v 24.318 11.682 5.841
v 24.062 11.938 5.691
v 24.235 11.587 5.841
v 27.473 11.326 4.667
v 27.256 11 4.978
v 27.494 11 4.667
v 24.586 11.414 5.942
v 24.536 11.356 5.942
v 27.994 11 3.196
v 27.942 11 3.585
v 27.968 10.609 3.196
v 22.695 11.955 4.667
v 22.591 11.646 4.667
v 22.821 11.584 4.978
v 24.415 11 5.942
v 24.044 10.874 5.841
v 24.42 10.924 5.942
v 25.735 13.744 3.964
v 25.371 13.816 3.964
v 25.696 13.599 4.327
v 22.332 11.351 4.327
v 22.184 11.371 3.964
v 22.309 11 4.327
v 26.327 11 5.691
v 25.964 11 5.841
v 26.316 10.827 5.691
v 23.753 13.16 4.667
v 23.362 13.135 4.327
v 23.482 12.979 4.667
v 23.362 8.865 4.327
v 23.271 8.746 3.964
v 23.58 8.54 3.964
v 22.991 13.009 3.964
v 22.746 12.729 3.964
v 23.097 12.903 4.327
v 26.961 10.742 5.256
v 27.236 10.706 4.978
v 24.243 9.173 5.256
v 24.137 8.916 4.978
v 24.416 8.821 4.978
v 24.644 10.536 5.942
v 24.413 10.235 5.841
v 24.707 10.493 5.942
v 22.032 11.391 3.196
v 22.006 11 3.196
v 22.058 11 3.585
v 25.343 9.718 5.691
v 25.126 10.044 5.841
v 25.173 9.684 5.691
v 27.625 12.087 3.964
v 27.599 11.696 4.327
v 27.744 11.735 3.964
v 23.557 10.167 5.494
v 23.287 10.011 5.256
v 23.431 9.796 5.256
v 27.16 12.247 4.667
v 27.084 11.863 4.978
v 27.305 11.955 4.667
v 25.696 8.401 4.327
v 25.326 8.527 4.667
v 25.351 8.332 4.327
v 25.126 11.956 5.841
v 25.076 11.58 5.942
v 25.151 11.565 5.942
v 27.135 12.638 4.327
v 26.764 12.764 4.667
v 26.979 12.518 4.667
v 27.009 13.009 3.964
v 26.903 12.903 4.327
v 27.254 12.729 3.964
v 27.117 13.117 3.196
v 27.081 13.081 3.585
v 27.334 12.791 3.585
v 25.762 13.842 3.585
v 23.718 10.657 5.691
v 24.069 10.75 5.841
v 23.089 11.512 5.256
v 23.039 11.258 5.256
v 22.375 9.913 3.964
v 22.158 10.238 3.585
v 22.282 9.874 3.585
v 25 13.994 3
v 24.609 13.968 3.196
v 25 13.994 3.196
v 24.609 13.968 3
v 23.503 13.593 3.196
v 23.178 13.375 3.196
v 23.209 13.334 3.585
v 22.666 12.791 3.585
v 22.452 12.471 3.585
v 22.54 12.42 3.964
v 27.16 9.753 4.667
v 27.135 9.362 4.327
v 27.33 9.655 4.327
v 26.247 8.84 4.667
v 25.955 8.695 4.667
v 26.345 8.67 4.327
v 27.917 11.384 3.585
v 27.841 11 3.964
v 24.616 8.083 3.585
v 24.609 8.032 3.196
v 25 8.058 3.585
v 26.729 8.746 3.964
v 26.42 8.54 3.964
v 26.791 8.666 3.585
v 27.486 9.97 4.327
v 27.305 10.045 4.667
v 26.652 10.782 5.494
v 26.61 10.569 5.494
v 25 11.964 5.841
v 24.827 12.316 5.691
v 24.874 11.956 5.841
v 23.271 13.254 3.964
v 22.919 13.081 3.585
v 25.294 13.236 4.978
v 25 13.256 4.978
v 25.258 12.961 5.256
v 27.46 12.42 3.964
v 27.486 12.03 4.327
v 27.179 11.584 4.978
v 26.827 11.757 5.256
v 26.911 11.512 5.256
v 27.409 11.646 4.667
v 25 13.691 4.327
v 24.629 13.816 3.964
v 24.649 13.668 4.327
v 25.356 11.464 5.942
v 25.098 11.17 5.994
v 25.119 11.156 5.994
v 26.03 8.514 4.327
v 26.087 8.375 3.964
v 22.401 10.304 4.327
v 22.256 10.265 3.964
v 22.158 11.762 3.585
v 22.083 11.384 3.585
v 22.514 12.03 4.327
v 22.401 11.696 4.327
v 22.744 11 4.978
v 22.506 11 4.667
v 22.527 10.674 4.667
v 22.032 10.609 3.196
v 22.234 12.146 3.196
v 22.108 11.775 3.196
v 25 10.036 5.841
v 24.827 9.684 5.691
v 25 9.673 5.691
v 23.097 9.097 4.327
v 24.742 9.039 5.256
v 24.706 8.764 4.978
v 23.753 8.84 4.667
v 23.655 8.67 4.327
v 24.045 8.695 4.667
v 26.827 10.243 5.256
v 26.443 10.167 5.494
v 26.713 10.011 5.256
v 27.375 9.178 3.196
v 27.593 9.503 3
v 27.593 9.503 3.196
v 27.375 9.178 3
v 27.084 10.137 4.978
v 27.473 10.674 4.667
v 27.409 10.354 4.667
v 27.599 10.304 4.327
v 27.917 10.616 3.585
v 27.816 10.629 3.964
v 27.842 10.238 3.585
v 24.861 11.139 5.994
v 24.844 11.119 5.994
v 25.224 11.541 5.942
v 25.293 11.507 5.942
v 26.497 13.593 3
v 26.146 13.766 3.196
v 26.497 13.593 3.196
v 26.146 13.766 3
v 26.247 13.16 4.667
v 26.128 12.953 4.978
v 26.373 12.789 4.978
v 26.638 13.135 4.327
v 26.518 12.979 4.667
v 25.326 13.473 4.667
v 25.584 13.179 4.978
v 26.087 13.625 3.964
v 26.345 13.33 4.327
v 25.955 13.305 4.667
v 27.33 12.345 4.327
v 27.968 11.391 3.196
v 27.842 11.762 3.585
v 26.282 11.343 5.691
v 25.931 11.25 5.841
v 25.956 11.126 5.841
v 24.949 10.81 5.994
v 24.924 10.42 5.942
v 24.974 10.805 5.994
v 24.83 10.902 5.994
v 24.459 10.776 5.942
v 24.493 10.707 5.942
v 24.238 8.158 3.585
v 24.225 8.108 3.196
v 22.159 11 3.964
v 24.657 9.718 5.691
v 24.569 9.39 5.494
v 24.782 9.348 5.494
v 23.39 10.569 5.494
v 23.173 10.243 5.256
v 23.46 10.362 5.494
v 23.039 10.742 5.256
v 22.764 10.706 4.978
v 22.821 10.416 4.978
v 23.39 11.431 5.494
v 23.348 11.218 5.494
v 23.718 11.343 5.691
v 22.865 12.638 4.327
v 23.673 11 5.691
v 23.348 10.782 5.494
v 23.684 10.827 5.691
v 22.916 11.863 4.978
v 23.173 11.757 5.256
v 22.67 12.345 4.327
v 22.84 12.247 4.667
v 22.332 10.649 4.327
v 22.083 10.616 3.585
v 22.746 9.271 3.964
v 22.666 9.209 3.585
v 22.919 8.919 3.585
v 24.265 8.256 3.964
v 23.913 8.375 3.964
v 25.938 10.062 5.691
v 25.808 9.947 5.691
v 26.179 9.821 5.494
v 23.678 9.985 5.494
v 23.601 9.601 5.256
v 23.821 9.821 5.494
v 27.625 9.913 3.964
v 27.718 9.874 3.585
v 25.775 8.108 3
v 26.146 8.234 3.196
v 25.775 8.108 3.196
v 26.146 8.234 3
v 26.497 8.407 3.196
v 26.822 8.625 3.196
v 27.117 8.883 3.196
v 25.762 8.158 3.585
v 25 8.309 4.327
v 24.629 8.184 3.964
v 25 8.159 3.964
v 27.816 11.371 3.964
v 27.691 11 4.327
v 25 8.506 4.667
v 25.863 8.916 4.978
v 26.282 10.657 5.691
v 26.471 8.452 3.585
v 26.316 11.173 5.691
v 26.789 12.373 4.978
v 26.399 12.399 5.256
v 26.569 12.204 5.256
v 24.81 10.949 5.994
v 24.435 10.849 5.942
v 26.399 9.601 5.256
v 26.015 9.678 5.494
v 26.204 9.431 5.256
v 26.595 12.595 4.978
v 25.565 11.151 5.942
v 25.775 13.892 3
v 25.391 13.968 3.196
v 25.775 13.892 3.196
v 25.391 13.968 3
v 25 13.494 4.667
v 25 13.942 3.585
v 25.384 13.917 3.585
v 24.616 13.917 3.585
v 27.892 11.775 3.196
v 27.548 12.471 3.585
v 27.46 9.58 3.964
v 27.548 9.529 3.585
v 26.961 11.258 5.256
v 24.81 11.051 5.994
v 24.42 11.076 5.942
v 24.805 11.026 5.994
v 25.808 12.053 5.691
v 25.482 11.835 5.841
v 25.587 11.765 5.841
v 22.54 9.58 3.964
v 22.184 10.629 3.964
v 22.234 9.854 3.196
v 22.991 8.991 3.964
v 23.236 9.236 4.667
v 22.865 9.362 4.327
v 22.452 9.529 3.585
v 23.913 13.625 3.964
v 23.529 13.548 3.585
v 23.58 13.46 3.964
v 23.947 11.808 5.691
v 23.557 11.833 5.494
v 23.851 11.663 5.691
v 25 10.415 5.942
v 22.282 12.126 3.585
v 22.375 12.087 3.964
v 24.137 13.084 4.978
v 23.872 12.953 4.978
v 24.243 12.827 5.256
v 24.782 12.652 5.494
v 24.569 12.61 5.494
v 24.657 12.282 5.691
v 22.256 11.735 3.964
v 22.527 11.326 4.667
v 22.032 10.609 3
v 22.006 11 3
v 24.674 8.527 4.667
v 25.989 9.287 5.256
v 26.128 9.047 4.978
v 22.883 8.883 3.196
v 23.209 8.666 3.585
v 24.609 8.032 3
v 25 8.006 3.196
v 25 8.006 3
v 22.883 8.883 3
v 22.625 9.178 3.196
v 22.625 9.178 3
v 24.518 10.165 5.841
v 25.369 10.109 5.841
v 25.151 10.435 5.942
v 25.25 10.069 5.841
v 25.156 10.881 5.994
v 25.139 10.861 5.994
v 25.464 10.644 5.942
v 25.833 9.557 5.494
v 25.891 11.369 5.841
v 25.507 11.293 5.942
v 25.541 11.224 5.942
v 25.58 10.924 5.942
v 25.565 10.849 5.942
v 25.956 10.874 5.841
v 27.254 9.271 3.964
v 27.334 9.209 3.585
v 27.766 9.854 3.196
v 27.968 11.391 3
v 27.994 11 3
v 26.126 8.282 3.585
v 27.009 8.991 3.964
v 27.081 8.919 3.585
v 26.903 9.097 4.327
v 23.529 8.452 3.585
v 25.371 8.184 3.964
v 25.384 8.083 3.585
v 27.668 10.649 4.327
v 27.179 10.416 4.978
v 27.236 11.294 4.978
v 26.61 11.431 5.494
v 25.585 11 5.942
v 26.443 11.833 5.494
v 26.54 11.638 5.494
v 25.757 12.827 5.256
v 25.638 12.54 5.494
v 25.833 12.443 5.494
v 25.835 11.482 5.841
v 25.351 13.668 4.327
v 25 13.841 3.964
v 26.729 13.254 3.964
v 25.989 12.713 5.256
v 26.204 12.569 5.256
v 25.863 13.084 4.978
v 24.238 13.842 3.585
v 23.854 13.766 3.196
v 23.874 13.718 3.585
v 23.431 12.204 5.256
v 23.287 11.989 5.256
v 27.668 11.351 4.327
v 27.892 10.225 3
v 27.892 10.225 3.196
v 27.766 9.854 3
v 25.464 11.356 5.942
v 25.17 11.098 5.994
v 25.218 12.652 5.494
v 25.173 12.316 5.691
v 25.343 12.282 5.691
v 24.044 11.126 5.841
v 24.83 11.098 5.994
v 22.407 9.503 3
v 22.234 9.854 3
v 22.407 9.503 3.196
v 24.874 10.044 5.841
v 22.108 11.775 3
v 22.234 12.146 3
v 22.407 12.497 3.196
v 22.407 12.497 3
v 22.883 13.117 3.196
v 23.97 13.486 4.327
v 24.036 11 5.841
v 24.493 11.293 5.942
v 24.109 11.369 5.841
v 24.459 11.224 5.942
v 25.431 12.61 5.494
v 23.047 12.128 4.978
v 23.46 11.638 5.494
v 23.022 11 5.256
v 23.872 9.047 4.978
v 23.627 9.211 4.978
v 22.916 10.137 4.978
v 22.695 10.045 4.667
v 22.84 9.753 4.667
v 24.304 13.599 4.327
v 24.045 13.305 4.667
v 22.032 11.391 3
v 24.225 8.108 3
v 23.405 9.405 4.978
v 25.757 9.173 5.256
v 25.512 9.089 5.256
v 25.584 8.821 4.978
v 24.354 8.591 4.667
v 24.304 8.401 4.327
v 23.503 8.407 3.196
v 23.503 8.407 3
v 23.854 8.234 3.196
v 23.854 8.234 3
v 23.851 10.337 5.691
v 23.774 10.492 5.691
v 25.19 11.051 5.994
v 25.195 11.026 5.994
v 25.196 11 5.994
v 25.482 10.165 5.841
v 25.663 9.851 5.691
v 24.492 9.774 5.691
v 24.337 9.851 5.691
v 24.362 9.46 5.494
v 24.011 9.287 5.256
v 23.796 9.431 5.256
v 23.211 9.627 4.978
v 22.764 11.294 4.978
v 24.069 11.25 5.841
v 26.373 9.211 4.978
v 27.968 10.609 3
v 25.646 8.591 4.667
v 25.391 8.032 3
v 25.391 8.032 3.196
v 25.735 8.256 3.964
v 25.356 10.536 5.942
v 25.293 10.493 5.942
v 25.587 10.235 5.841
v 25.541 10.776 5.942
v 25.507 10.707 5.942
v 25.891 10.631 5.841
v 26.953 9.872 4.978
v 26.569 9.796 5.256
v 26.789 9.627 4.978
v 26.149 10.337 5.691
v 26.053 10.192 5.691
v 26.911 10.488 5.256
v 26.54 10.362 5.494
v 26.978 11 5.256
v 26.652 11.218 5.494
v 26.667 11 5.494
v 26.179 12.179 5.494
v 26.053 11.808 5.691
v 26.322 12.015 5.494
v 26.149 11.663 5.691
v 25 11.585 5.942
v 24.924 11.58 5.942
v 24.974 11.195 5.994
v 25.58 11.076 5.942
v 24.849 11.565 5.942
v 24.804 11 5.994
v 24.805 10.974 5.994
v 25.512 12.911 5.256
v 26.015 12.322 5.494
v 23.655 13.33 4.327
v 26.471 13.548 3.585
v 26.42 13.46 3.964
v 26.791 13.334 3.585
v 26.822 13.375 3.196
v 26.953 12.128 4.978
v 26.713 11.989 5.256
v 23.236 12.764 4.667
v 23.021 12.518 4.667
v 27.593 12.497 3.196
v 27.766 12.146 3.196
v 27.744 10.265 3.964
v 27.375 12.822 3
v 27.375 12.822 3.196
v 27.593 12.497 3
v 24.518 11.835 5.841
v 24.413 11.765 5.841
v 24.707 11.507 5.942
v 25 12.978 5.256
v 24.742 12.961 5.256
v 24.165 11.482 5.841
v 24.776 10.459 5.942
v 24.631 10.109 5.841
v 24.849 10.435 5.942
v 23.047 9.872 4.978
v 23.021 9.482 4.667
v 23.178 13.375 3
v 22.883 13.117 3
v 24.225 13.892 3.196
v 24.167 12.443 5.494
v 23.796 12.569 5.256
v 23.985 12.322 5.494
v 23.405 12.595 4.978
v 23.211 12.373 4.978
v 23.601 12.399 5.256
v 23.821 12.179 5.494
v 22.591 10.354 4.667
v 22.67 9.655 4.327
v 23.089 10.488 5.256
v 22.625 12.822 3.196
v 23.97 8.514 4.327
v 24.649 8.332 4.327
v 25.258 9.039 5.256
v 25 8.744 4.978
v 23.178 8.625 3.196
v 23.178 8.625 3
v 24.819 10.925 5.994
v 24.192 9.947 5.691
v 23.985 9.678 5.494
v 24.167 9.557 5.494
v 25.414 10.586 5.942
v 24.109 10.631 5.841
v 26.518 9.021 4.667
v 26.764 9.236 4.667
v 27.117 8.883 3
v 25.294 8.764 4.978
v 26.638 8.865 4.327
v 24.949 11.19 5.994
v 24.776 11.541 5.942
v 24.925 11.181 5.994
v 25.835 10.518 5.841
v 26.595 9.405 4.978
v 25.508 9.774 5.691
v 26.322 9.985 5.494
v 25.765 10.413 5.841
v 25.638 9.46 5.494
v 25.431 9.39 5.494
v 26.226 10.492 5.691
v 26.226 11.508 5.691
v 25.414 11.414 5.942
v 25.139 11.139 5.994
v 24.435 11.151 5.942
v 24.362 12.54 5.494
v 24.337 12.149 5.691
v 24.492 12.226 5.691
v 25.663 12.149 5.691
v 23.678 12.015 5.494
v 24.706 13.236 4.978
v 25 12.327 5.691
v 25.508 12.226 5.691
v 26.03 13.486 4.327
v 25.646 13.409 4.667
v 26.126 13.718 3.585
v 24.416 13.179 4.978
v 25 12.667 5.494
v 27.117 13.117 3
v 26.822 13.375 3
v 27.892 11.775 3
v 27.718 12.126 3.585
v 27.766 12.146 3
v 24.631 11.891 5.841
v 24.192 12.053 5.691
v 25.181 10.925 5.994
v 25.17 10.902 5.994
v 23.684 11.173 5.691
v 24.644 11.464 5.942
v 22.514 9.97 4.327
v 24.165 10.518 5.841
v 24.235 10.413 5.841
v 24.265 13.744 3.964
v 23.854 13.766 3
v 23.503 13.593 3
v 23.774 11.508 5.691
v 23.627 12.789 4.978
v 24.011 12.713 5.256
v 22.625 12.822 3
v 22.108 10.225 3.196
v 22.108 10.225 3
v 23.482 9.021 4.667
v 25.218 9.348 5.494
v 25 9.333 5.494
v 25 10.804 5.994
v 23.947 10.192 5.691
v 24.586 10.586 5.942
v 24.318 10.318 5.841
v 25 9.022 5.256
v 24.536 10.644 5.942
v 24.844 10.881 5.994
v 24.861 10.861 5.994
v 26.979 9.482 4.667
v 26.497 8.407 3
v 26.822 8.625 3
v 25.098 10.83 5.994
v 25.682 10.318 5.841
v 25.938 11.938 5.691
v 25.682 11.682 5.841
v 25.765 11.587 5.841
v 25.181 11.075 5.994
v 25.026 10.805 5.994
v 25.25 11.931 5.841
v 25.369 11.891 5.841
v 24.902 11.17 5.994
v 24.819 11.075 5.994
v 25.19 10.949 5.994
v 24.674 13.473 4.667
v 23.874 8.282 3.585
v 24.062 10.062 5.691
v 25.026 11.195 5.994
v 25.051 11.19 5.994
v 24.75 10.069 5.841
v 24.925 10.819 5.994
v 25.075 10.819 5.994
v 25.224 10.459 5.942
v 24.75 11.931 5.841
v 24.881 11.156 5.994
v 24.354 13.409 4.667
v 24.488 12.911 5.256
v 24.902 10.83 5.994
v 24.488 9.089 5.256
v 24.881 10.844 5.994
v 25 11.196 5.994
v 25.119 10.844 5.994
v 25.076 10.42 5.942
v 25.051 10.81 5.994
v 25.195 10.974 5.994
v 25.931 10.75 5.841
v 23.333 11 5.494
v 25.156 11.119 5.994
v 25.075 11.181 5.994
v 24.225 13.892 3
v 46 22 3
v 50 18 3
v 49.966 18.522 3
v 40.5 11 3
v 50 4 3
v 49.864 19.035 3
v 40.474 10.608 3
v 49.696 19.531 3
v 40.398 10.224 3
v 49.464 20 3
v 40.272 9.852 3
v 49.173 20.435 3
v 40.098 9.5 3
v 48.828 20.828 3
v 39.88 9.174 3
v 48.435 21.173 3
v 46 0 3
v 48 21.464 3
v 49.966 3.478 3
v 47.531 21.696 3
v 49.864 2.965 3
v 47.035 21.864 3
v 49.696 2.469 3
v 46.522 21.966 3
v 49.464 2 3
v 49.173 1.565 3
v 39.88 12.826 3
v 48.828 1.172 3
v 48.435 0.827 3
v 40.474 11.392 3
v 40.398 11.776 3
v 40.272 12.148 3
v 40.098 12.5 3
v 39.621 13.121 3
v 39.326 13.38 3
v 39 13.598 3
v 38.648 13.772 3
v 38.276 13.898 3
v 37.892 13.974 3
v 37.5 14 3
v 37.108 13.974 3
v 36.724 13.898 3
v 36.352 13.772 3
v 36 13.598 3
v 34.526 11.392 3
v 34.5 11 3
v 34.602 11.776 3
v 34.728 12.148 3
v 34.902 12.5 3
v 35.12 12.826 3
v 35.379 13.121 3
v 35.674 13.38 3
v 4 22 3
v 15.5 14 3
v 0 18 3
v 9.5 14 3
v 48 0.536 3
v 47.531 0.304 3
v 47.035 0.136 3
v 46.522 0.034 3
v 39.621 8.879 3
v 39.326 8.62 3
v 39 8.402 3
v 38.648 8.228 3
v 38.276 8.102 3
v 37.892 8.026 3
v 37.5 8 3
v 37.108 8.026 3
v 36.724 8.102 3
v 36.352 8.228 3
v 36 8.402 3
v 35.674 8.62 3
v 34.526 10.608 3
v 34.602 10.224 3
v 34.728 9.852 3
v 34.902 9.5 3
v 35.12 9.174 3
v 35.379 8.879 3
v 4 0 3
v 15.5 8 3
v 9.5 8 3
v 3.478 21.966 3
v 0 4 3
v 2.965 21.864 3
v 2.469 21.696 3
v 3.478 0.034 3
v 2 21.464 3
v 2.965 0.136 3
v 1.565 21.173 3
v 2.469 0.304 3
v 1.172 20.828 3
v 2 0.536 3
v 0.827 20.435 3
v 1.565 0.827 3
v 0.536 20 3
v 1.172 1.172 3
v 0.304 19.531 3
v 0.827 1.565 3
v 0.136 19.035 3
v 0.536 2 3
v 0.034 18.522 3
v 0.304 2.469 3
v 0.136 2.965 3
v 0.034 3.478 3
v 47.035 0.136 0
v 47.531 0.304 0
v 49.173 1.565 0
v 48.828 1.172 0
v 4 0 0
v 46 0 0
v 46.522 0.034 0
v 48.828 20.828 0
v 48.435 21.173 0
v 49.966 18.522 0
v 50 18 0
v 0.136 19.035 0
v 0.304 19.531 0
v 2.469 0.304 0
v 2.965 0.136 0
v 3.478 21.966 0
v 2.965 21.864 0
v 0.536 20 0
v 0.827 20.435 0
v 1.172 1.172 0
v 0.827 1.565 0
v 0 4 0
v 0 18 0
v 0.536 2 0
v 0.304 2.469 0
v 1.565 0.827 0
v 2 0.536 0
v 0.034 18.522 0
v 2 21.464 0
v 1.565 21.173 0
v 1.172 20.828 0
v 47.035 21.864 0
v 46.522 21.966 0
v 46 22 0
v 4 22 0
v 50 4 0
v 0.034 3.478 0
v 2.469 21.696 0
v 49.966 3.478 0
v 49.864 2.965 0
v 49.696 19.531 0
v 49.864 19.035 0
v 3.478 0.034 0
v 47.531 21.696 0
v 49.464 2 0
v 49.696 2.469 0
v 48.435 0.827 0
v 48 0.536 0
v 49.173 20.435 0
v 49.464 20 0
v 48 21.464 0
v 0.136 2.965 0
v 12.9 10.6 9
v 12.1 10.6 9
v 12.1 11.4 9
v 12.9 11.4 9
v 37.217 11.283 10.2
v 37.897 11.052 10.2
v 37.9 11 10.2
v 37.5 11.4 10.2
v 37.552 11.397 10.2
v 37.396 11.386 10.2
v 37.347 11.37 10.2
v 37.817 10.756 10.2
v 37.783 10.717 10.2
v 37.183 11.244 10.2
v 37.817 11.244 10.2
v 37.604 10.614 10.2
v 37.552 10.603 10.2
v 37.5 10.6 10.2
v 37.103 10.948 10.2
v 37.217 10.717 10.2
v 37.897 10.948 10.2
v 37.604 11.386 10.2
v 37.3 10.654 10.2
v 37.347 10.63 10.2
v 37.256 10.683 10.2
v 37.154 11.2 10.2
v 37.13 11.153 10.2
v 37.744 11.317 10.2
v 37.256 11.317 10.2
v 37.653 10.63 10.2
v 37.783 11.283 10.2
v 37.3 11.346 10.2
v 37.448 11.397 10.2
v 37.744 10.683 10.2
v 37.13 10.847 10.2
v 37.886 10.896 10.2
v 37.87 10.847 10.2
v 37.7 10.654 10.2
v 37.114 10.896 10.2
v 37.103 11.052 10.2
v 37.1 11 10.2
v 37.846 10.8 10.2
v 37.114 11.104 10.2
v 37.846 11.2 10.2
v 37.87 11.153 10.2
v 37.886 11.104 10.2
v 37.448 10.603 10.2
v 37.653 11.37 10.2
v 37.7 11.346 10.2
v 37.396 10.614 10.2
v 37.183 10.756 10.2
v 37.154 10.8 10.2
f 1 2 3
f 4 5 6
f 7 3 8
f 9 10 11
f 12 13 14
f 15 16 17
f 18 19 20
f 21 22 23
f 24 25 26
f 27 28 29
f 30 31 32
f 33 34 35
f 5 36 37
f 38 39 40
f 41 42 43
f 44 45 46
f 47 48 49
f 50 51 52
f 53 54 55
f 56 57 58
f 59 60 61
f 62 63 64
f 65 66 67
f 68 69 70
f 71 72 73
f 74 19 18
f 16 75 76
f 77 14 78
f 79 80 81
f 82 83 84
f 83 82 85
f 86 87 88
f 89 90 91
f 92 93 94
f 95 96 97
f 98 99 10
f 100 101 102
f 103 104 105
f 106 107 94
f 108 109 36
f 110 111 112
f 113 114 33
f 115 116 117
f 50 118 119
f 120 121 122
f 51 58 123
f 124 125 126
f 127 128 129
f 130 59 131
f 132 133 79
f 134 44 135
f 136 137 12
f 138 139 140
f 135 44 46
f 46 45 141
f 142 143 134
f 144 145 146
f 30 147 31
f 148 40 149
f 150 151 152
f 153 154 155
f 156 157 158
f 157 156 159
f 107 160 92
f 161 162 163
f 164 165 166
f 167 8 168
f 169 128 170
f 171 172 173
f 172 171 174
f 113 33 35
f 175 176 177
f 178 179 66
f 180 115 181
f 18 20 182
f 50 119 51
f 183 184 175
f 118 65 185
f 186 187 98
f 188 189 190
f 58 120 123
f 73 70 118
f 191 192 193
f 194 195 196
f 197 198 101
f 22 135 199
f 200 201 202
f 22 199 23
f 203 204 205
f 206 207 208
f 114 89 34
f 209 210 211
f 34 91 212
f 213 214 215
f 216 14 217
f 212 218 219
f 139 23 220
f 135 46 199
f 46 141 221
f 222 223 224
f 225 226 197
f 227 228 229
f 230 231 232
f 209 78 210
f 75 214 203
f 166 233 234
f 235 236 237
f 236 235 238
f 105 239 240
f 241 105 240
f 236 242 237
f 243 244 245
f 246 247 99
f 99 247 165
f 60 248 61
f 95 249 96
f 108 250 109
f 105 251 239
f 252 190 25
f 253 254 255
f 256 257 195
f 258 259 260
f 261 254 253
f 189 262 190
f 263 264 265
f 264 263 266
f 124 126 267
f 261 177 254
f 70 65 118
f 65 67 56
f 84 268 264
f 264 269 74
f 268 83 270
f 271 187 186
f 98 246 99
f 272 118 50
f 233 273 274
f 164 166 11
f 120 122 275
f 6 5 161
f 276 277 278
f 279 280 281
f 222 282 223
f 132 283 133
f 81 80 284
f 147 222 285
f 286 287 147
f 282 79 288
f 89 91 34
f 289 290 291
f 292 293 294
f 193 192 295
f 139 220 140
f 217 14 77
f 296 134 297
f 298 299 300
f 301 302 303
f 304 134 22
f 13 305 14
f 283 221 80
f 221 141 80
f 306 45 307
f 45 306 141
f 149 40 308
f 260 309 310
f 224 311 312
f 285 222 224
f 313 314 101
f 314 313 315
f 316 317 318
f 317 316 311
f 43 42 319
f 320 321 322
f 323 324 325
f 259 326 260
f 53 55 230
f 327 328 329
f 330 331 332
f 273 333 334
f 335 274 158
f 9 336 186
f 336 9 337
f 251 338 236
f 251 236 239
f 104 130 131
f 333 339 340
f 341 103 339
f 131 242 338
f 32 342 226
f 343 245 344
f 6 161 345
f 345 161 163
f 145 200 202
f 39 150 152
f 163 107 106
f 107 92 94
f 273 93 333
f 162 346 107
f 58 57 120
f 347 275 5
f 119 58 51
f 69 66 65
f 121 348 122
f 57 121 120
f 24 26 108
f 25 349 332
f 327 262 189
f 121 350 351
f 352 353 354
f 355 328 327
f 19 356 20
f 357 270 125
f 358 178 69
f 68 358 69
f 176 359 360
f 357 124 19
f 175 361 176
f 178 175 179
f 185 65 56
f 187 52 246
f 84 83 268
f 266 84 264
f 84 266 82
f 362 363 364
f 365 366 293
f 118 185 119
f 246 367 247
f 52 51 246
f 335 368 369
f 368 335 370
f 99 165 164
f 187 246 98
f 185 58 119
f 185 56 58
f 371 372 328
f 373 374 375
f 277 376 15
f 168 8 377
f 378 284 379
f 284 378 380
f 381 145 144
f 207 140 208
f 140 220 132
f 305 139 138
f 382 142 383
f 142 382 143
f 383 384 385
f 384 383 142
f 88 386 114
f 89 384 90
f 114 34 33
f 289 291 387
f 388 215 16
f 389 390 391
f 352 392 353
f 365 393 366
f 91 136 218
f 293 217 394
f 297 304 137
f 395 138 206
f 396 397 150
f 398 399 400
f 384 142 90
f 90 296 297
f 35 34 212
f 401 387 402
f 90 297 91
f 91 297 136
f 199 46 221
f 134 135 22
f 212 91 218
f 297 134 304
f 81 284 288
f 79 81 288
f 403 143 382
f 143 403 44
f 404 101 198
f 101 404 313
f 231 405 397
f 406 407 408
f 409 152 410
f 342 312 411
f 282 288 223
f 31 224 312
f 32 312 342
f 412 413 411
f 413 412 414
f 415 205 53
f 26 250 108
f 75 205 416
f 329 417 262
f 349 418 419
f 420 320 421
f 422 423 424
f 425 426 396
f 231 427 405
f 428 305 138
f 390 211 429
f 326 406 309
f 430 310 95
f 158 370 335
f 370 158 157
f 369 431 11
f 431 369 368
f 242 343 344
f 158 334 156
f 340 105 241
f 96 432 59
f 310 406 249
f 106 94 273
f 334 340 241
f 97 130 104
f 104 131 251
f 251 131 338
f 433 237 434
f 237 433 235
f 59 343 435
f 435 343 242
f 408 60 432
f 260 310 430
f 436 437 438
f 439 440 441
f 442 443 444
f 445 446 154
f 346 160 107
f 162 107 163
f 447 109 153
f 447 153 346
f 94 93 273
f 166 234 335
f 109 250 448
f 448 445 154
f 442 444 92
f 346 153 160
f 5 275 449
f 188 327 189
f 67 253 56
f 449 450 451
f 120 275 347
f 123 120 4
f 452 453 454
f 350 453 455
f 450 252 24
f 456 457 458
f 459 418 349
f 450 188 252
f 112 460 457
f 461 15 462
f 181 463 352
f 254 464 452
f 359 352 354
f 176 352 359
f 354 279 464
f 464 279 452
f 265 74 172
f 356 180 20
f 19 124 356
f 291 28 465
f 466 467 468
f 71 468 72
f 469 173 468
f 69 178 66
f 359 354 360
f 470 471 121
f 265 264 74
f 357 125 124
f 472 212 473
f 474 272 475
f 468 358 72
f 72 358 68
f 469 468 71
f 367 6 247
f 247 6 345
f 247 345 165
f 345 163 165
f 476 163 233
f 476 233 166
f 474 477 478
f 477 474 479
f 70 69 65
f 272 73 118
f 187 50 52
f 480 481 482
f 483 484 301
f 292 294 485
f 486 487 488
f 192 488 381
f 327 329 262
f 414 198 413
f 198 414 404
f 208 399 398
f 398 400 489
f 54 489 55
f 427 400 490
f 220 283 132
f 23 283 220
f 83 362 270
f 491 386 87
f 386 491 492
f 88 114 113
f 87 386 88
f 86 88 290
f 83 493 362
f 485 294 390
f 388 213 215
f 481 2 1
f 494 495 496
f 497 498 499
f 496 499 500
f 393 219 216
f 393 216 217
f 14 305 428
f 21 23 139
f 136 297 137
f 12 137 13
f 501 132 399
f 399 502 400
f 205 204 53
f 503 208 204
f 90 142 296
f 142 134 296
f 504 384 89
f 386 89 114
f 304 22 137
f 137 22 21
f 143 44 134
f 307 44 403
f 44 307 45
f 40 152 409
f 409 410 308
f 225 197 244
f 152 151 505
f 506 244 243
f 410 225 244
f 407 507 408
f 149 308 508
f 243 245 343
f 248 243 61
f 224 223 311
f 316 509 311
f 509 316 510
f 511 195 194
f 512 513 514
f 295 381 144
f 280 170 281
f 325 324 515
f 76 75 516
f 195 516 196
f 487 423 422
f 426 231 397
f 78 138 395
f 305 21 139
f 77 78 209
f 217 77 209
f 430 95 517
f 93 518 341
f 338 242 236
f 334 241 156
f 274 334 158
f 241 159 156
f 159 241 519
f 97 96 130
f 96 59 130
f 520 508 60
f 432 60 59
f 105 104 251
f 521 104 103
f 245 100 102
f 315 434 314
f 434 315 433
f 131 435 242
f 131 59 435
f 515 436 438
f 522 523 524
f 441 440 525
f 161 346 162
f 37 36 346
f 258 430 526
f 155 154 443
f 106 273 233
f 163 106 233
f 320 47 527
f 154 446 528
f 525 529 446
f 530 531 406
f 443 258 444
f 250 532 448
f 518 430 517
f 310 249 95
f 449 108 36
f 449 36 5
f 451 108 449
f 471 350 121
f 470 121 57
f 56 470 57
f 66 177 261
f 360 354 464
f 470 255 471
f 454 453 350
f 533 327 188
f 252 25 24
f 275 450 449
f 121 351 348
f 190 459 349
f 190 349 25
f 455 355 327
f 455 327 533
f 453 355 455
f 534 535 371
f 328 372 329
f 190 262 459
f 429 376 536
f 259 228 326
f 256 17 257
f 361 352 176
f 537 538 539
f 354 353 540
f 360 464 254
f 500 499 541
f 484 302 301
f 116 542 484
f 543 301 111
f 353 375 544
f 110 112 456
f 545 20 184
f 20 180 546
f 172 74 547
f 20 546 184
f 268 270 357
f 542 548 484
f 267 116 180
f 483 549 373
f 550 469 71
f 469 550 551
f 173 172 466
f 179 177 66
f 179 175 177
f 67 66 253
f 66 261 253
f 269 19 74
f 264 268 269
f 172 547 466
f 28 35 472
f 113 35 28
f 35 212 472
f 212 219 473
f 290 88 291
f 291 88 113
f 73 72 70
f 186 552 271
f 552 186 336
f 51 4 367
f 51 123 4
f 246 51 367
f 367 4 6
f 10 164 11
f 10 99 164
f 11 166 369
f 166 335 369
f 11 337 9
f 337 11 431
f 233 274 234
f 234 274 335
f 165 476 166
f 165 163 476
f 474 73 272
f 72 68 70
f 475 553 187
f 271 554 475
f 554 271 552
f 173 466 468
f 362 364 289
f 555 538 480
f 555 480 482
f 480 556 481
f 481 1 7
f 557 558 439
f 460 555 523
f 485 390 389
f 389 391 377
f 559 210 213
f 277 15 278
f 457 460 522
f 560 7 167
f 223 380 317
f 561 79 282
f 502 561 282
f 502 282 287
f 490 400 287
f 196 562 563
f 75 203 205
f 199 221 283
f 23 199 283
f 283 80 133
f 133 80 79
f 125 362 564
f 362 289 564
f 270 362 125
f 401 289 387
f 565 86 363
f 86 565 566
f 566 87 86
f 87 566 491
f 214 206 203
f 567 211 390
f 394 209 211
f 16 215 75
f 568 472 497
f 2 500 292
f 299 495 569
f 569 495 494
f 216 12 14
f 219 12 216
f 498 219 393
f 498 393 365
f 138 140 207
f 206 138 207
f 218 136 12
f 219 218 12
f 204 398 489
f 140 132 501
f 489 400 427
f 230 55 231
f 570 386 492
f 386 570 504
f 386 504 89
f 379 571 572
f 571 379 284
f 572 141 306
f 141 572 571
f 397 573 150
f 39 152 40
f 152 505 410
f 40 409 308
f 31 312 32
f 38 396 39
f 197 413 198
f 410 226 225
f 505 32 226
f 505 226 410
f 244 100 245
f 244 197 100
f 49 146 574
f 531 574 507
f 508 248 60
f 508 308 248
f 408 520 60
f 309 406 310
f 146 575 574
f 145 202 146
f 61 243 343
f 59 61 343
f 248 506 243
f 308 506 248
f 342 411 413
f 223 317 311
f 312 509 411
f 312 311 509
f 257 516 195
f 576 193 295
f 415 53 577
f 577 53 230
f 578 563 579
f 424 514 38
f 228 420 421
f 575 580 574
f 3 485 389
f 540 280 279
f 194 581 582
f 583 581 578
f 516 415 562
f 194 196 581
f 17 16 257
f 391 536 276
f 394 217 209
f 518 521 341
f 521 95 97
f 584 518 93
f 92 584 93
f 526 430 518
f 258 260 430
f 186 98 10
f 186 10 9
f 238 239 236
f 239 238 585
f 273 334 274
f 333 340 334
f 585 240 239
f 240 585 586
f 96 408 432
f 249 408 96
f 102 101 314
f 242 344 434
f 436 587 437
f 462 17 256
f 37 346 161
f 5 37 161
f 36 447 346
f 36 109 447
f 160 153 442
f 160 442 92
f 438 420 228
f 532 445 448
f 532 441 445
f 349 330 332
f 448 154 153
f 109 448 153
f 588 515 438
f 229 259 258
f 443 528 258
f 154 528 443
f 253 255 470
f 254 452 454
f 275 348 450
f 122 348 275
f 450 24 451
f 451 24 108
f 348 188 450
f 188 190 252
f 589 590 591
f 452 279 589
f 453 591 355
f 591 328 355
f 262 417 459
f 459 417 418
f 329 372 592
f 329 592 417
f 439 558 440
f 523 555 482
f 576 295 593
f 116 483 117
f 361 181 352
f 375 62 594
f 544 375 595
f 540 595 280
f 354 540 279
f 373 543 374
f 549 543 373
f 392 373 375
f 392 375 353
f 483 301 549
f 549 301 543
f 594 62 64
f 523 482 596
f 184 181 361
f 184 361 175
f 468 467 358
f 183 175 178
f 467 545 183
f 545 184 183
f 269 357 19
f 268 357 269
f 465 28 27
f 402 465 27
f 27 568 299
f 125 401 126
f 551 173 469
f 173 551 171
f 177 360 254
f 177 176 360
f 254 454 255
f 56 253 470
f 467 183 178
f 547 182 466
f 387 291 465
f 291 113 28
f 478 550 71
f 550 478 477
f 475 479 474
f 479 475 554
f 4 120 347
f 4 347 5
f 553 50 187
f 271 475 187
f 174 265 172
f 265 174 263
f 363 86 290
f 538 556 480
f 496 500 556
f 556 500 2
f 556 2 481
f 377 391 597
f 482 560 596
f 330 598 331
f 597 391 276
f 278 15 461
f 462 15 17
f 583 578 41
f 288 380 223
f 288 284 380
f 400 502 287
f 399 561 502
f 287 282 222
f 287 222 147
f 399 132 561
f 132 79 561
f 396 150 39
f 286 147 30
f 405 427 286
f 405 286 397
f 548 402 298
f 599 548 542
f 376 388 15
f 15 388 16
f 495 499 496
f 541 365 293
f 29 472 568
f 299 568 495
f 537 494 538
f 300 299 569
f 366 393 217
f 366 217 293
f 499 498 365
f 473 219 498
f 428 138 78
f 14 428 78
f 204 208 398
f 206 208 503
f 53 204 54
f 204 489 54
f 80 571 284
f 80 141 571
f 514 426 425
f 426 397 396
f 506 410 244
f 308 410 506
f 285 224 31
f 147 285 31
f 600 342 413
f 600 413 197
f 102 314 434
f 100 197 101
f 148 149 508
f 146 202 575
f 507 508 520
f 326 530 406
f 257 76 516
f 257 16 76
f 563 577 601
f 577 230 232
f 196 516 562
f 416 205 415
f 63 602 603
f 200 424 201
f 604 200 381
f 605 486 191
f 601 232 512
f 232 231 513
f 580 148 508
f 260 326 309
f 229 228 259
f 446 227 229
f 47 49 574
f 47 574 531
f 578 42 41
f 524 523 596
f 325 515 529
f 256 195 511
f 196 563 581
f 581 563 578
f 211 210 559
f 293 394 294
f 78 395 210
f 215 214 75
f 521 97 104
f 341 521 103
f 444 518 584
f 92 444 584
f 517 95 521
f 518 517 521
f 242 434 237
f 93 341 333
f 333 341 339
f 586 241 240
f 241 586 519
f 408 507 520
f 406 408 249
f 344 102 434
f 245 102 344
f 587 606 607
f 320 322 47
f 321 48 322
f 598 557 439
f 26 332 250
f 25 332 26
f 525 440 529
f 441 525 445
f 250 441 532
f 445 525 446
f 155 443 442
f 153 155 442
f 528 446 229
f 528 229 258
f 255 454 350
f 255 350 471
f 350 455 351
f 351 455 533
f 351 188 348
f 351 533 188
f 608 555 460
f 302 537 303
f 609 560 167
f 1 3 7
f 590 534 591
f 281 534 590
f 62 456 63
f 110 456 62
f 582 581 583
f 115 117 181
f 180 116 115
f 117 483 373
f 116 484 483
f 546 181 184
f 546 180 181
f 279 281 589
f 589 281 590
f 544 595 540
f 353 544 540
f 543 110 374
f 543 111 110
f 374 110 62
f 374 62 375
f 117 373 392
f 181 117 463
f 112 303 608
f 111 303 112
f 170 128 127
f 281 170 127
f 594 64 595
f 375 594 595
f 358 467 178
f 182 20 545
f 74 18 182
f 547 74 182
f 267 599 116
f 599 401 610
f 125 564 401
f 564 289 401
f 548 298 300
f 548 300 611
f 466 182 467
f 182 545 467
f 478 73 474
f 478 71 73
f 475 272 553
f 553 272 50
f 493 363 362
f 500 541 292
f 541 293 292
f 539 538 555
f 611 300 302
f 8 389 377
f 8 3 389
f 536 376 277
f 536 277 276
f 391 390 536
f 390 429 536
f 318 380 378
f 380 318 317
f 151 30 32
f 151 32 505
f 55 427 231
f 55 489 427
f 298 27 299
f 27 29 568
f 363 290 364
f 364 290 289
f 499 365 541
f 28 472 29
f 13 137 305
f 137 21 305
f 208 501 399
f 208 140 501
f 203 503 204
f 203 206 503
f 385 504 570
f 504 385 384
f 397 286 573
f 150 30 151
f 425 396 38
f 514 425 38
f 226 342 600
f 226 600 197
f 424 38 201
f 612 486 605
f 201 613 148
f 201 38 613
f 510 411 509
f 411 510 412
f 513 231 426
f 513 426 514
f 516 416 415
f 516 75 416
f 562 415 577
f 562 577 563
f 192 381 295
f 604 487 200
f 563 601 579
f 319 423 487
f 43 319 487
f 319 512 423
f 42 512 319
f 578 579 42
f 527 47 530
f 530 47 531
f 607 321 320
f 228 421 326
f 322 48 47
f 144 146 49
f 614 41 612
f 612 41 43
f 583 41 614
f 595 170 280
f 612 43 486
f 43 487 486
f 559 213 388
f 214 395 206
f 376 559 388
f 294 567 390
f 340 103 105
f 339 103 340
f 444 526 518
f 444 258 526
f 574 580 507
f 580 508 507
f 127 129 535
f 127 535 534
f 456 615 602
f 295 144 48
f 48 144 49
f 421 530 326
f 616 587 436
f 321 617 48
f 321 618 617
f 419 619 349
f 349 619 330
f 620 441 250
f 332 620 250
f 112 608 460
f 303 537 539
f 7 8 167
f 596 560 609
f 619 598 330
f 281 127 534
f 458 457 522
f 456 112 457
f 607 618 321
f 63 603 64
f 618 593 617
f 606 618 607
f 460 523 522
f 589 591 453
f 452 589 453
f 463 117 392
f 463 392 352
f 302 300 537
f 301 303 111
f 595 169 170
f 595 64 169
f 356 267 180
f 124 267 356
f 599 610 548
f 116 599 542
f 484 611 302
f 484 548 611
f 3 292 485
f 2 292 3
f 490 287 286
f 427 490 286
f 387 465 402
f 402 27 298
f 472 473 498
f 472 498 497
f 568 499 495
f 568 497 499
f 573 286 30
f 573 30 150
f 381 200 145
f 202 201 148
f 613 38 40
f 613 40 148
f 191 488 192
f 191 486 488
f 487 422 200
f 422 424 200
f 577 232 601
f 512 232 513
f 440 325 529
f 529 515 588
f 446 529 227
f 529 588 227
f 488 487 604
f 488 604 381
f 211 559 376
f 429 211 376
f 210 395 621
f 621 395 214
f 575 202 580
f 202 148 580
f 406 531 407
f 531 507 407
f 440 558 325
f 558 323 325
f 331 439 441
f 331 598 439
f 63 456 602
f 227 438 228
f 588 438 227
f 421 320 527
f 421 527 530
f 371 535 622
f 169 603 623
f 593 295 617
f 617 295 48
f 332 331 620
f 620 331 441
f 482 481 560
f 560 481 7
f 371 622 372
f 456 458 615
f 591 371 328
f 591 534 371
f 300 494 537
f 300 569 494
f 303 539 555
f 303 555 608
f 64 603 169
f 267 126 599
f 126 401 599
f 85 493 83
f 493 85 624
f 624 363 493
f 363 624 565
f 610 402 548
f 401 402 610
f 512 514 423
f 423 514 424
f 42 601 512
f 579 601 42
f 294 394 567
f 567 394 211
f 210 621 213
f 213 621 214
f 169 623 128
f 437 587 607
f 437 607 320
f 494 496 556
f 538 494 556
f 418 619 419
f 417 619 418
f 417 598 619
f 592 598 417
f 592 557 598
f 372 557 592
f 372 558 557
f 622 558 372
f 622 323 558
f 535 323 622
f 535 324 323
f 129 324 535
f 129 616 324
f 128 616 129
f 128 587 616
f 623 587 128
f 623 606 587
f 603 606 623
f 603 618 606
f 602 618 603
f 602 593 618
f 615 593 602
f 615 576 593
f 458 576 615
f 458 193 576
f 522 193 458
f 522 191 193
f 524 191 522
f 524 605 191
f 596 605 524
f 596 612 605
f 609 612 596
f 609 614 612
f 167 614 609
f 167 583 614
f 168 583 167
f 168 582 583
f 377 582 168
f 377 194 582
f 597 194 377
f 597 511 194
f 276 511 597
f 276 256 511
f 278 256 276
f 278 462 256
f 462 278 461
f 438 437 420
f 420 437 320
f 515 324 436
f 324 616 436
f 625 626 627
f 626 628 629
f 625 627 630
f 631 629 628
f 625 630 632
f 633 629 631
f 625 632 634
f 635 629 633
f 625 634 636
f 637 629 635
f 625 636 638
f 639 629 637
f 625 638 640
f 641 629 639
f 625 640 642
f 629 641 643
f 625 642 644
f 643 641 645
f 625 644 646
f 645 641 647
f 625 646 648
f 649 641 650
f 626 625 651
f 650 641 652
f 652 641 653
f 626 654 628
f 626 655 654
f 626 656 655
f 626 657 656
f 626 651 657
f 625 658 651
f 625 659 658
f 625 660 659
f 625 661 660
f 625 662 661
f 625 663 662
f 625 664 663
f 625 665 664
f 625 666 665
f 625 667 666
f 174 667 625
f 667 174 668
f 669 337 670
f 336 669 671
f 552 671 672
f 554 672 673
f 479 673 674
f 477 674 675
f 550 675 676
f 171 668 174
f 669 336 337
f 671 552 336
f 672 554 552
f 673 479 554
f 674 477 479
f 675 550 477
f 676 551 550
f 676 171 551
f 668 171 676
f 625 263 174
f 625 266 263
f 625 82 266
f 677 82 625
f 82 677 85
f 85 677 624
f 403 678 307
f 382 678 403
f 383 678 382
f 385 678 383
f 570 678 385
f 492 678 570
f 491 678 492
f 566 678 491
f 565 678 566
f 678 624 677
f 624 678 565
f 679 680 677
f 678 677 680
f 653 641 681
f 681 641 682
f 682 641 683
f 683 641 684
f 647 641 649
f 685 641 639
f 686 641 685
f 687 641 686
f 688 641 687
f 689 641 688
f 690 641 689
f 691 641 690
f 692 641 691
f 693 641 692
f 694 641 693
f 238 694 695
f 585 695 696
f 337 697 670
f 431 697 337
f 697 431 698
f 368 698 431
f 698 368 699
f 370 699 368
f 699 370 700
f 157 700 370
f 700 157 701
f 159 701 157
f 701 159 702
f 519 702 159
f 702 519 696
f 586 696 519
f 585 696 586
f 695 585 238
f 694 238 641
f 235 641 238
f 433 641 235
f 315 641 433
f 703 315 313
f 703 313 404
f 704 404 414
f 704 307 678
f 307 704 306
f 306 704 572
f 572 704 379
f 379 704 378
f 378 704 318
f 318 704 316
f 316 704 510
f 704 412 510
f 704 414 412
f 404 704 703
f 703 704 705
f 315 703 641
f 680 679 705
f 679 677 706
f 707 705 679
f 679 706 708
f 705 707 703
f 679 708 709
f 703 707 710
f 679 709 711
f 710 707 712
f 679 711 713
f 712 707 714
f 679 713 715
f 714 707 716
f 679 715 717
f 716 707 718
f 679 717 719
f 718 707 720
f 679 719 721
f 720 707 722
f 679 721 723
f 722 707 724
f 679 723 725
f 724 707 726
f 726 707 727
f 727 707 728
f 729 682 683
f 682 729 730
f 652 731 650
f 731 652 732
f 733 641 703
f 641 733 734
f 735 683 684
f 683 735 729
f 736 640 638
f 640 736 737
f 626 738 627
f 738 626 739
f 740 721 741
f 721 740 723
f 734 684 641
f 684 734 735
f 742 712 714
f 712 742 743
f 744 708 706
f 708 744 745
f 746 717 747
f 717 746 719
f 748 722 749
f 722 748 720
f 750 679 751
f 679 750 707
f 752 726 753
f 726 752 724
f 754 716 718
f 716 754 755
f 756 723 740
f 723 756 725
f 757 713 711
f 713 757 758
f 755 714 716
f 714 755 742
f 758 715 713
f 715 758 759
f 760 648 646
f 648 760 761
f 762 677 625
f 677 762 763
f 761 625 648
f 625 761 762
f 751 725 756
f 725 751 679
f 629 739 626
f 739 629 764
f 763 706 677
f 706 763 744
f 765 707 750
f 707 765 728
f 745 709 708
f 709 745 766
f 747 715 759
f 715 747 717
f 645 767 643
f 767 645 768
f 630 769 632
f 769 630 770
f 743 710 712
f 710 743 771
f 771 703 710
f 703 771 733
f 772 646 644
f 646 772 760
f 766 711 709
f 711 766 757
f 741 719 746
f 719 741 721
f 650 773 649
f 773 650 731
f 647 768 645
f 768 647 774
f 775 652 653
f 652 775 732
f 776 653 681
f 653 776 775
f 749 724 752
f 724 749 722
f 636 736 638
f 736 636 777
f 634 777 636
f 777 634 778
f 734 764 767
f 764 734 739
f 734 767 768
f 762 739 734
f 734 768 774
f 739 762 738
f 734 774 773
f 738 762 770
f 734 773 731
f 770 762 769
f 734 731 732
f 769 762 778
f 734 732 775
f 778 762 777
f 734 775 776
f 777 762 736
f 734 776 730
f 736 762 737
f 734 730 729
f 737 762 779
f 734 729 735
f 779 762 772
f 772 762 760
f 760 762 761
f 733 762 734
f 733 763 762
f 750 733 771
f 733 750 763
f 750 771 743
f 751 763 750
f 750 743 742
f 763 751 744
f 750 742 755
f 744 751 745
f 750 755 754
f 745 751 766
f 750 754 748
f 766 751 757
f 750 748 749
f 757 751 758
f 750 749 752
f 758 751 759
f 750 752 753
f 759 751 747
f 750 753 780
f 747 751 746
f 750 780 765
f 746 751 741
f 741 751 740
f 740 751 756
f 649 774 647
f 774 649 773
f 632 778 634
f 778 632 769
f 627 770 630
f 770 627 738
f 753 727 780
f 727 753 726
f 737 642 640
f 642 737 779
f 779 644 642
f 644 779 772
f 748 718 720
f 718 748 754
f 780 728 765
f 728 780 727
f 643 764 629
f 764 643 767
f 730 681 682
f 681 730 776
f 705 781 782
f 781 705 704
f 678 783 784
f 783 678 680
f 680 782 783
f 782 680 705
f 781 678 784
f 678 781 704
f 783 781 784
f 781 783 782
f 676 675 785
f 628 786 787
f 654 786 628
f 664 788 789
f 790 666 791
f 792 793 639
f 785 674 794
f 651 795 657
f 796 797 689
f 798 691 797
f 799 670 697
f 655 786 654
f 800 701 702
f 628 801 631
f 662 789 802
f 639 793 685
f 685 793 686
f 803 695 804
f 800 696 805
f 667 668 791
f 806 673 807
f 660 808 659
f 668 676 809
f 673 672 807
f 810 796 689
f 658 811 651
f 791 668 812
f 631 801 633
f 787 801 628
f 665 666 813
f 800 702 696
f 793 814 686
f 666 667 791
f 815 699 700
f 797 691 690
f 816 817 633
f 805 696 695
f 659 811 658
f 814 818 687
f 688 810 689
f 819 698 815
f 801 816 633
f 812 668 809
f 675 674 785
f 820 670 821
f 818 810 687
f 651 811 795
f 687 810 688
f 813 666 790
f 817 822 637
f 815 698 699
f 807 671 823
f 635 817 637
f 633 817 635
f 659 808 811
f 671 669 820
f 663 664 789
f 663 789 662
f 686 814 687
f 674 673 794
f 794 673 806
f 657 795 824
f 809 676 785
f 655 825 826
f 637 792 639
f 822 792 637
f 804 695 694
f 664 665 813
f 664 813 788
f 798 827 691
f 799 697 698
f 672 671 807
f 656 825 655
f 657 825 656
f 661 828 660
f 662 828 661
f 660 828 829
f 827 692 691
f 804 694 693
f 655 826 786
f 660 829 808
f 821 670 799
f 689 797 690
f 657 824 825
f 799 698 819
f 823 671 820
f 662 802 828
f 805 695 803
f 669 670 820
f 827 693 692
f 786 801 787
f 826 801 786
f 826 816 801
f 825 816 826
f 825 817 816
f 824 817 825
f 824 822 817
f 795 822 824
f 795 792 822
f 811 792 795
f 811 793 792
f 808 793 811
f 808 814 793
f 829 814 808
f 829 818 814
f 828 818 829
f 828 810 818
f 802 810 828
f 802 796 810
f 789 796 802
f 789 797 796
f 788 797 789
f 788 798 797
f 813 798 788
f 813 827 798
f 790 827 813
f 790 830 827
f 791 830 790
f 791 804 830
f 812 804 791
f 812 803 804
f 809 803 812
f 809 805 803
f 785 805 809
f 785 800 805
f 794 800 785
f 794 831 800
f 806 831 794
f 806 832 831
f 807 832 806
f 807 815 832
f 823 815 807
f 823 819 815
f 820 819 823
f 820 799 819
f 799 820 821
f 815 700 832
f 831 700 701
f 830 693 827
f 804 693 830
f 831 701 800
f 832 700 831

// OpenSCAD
// file: core/config.scad
// core/config.scad — grouped design configuration helpers.
// MIT licensed. See LICENSE-MIT.
//
// The public `studded_bracelet(...)` API stays flat for hand editing, but the
// assembly uses these grouped configs internally. They mirror the GitHub Pages
// configurator sections: band, surface, latch, and export stage.

OPEN_STUDS_FN = 48;

OPEN_STUDS_DEFAULT_CIRCUMFERENCE = 180;
OPEN_STUDS_DEFAULT_WIDTH         = 22;
OPEN_STUDS_DEFAULT_THICKNESS     = 3;
OPEN_STUDS_DEFAULT_CORNER        = 4;
OPEN_STUDS_LATCH_MARGIN          = 25;

OPEN_STUDS_DEFAULT_STUD          = "pyramid";
OPEN_STUDS_DEFAULT_PATTERN       = "single_row";
OPEN_STUDS_DEFAULT_ROWS          = 1;
OPEN_STUDS_DEFAULT_STUD_SIZE     = 6;
OPEN_STUDS_DEFAULT_TIP_RADIUS    = 0.4;

OPEN_STUDS_DEFAULT_SOCKET_DEPTH  = 1.5;
OPEN_STUDS_DEFAULT_HOLE_DIAMETER = 3;

// --- band config -----------------------------------------------------------

function band_config(
    circumference      = OPEN_STUDS_DEFAULT_CIRCUMFERENCE,
    width              = OPEN_STUDS_DEFAULT_WIDTH,
    thickness          = OPEN_STUDS_DEFAULT_THICKNESS,
    corner             = OPEN_STUDS_DEFAULT_CORNER,
    flex_relief        = "none",
    relief_pitch       = 10,
    relief_width       = 1.2,
    relief_depth       = undef,
    relief_edge_margin = 2,
    relief_margin      = OPEN_STUDS_LATCH_MARGIN
) = [
    circumference,
    width,
    thickness,
    corner,
    flex_relief,
    relief_pitch,
    relief_width,
    relief_depth,
    relief_edge_margin,
    relief_margin
];

function band_cfg_length(c)             = c[0];
function band_cfg_width(c)              = c[1];
function band_cfg_thickness(c)          = c[2];
function band_cfg_corner(c)             = c[3];
function band_cfg_flex_relief(c)        = c[4];
function band_cfg_relief_pitch(c)       = c[5];
function band_cfg_relief_width(c)       = c[6];
function band_cfg_relief_depth(c)       = c[7];
function band_cfg_relief_edge_margin(c) = c[8];
function band_cfg_relief_margin(c)      = c[9];

// --- surface config --------------------------------------------------------

function surface_config(
    mode            = "integral",
    stud_module     = OPEN_STUDS_DEFAULT_STUD,
    stud_pattern    = OPEN_STUDS_DEFAULT_PATTERN,
    stud_rows       = OPEN_STUDS_DEFAULT_ROWS,
    stud_size       = OPEN_STUDS_DEFAULT_STUD_SIZE,
    tip_radius      = OPEN_STUDS_DEFAULT_TIP_RADIUS,
    stud_spacing    = undef,
    socket_depth    = OPEN_STUDS_DEFAULT_SOCKET_DEPTH,
    socket_diameter = undef,
    hole_diameter   = OPEN_STUDS_DEFAULT_HOLE_DIAMETER
) = [
    mode,
    stud_module,
    stud_pattern,
    stud_rows,
    stud_size,
    tip_radius,
    stud_spacing,
    socket_depth,
    socket_diameter,
    hole_diameter
];

function surface_cfg_mode(c)            = c[0];
function surface_cfg_stud_module(c)     = c[1];
function surface_cfg_pattern(c)         = c[2];
function surface_cfg_rows(c)            = c[3];
function surface_cfg_stud_size(c)       = c[4];
function surface_cfg_tip_radius(c)      = c[5];
function surface_cfg_spacing(c)         = c[6];
function surface_cfg_socket_depth(c)    = c[7];
function surface_cfg_socket_diameter(c) = c[8];
function surface_cfg_hole_diameter(c)   = c[9];

// --- latch config ----------------------------------------------------------

function latch_config(
    type      = "buckle",
    clearance = OPEN_STUDS_LATCH_MARGIN
) = [
    type,
    clearance
];

function latch_cfg_type(c)      = c[0];
function latch_cfg_clearance(c) = c[1];

// --- export config ---------------------------------------------------------

function export_config(
    stage       = "print_flat",
    test_length = 70
) = [
    stage,
    test_length
];

function export_cfg_stage(c)       = c[0];
function export_cfg_test_length(c) = c[1];
// file: core/band.scad
// core/band.scad — bracelet substrate geometry.
// MIT licensed. See LICENSE-MIT.

include <config.scad>

// --- flat printable substrate ---------------------------------------------

module band_strip(length, width, thickness, corner = OPEN_STUDS_DEFAULT_CORNER) {
    linear_extrude(height = thickness)
        if (corner > 0)
            offset(r = corner) offset(delta = -corner)
                square([length, width], center = false);
        else
            square([length, width], center = false);
}

function band_relief_enabled(mode, thickness) =
    mode == "inside_slots" || mode == "slots" ||
    (mode == "auto" && thickness >= 3.6);

function band_relief_depth(thickness, relief_depth) =
    max(0, min(
        thickness - 0.6,
        is_undef(relief_depth) ? max(0, thickness - 1.2) : relief_depth
    ));

module band_flex_relief_cuts(
    length,
    width,
    thickness,
    relief_pitch       = 10,
    relief_width       = 1.2,
    relief_depth       = undef,
    relief_edge_margin = 2,
    relief_margin      = OPEN_STUDS_LATCH_MARGIN
) {
    depth = band_relief_depth(thickness, relief_depth);
    slot_y = relief_edge_margin;
    slot_width = max(0, width - 2 * relief_edge_margin);

    if (relief_pitch > 0 && relief_width > 0 && depth > 0 && slot_width > 0)
        for (x = [relief_margin : relief_pitch : length - relief_margin])
            translate([x - relief_width / 2, slot_y, -0.05])
                cube([relief_width, slot_width, depth + 0.1], center = false);
}

module bracelet_band(
    length,
    width,
    thickness,
    corner             = OPEN_STUDS_DEFAULT_CORNER,
    flex_relief        = "none",
    relief_pitch       = 10,
    relief_width       = 1.2,
    relief_depth       = undef,
    relief_edge_margin = 2,
    relief_margin      = OPEN_STUDS_LATCH_MARGIN
) {
    difference() {
        band_strip(length, width, thickness, corner);

        if (band_relief_enabled(flex_relief, thickness))
            band_flex_relief_cuts(
                length,
                width,
                thickness,
                relief_pitch,
                relief_width,
                relief_depth,
                relief_edge_margin,
                relief_margin
            );
    }
}

module bracelet_band_from_config(cfg) {
    bracelet_band(
        length             = band_cfg_length(cfg),
        width              = band_cfg_width(cfg),
        thickness          = band_cfg_thickness(cfg),
        corner             = band_cfg_corner(cfg),
        flex_relief        = band_cfg_flex_relief(cfg),
        relief_pitch       = band_cfg_relief_pitch(cfg),
        relief_width       = band_cfg_relief_width(cfg),
        relief_depth       = band_cfg_relief_depth(cfg),
        relief_edge_margin = band_cfg_relief_edge_margin(cfg),
        relief_margin      = band_cfg_relief_margin(cfg)
    );
}
// file: studs/cone_spike.scad
// studs/cone_spike.scad — round-base cone spike.
// MIT licensed.

module stud_cone_spike(size = 6, tip_radius = 0.4, height = undef) {
    h = is_undef(height) ? size * 1.2 : height;
    cylinder(h = h, r1 = size / 2, r2 = max(tip_radius, 0.001));
}

stud_cone_spike(size = 8, tip_radius = 0.4);
// file: studs/dome.scad
// studs/dome.scad — half-sphere stud.
// MIT licensed.

module stud_dome(size = 6, tip_radius = 0.4, height = undef) {
    // `size` is the base diameter; `tip_radius` is unused for a dome
    // (the dome is naturally rounded). `height` defaults to a half-sphere.
    r = size / 2;
    h = is_undef(height) ? r : height;

    intersection() {
        sphere(r = r);
        translate([-r, -r, 0]) cube([size, size, h]);
    }
}

stud_dome(size = 8);
// file: studs/pyramid.scad
// studs/pyramid.scad — classic 4-sided pyramid.
// MIT licensed.
//
// Module contract (see CONTRIBUTING.md):
//   stud_pyramid(size, tip_radius, height)
//   - origin at base center, axis along +Z, base on z=0
//
// LEARNING-MODE NOTE: there are three reasonable ways to build a pyramid in
// OpenSCAD. We use `cylinder($fn=4)` because tip_radius drops in cleanly as
// the top radius. Alternatives if you want to revisit:
//   (a) polyhedron with explicit vertices  — most control, no fillet support
//   (b) hull() over a square base and a point — clean, harder to flatten tip
//   (c) minkowski() of (a) with a small sphere — true fillet, slow render

module stud_pyramid(size = 6, tip_radius = 0.4, height = undef) {
    h = is_undef(height) ? size : height;

    // cylinder $fn=4 produces a 4-sided prism. To make the *corners* sit at
    // x=±size/2 and y=±size/2, the base radius must be (size/2)*sqrt(2).
    base_r = (size / 2) * sqrt(2);
    top_r  = tip_radius > 0 ? tip_radius * sqrt(2) : 0;

    rotate([0, 0, 45])
        cylinder(h = h, r1 = base_r, r2 = top_r, $fn = 4);
}

// development render
stud_pyramid(size = 8, tip_radius = 0.4);
// main file
// sizing_test.scad — print this before committing to a full bracelet.
//
// A short calibration strip with three example studs unioned on top.
// Wrap it around your wrist (it's flexible TPU). If the band wraps comfortably
// and the studs feel right, the full bracelet at your measured circumference
// will fit.
//
// Tweak `strip_length`, `width`, and `thickness` until the band feels right.

use <studs/pyramid.scad>
use <studs/dome.scad>
use <studs/cone_spike.scad>
use <core/band.scad>

$fn = 48;

strip_length = 50;   // mm — short enough to be a quick print
width        = 22;   // mm
thickness    = 3;    // mm

module sizing_test() {
    union() {
        bracelet_band(strip_length, width, thickness);

        // three reference studs spaced evenly
        translate([strip_length * 0.25, width / 2, thickness])
            stud_pyramid(size = 6, tip_radius = 0.4);
        translate([strip_length * 0.50, width / 2, thickness])
            stud_dome(size = 6, tip_radius = 0.4);
        translate([strip_length * 0.75, width / 2, thickness])
            stud_cone_spike(size = 6, tip_radius = 0.4);
    }
}

sizing_test();
